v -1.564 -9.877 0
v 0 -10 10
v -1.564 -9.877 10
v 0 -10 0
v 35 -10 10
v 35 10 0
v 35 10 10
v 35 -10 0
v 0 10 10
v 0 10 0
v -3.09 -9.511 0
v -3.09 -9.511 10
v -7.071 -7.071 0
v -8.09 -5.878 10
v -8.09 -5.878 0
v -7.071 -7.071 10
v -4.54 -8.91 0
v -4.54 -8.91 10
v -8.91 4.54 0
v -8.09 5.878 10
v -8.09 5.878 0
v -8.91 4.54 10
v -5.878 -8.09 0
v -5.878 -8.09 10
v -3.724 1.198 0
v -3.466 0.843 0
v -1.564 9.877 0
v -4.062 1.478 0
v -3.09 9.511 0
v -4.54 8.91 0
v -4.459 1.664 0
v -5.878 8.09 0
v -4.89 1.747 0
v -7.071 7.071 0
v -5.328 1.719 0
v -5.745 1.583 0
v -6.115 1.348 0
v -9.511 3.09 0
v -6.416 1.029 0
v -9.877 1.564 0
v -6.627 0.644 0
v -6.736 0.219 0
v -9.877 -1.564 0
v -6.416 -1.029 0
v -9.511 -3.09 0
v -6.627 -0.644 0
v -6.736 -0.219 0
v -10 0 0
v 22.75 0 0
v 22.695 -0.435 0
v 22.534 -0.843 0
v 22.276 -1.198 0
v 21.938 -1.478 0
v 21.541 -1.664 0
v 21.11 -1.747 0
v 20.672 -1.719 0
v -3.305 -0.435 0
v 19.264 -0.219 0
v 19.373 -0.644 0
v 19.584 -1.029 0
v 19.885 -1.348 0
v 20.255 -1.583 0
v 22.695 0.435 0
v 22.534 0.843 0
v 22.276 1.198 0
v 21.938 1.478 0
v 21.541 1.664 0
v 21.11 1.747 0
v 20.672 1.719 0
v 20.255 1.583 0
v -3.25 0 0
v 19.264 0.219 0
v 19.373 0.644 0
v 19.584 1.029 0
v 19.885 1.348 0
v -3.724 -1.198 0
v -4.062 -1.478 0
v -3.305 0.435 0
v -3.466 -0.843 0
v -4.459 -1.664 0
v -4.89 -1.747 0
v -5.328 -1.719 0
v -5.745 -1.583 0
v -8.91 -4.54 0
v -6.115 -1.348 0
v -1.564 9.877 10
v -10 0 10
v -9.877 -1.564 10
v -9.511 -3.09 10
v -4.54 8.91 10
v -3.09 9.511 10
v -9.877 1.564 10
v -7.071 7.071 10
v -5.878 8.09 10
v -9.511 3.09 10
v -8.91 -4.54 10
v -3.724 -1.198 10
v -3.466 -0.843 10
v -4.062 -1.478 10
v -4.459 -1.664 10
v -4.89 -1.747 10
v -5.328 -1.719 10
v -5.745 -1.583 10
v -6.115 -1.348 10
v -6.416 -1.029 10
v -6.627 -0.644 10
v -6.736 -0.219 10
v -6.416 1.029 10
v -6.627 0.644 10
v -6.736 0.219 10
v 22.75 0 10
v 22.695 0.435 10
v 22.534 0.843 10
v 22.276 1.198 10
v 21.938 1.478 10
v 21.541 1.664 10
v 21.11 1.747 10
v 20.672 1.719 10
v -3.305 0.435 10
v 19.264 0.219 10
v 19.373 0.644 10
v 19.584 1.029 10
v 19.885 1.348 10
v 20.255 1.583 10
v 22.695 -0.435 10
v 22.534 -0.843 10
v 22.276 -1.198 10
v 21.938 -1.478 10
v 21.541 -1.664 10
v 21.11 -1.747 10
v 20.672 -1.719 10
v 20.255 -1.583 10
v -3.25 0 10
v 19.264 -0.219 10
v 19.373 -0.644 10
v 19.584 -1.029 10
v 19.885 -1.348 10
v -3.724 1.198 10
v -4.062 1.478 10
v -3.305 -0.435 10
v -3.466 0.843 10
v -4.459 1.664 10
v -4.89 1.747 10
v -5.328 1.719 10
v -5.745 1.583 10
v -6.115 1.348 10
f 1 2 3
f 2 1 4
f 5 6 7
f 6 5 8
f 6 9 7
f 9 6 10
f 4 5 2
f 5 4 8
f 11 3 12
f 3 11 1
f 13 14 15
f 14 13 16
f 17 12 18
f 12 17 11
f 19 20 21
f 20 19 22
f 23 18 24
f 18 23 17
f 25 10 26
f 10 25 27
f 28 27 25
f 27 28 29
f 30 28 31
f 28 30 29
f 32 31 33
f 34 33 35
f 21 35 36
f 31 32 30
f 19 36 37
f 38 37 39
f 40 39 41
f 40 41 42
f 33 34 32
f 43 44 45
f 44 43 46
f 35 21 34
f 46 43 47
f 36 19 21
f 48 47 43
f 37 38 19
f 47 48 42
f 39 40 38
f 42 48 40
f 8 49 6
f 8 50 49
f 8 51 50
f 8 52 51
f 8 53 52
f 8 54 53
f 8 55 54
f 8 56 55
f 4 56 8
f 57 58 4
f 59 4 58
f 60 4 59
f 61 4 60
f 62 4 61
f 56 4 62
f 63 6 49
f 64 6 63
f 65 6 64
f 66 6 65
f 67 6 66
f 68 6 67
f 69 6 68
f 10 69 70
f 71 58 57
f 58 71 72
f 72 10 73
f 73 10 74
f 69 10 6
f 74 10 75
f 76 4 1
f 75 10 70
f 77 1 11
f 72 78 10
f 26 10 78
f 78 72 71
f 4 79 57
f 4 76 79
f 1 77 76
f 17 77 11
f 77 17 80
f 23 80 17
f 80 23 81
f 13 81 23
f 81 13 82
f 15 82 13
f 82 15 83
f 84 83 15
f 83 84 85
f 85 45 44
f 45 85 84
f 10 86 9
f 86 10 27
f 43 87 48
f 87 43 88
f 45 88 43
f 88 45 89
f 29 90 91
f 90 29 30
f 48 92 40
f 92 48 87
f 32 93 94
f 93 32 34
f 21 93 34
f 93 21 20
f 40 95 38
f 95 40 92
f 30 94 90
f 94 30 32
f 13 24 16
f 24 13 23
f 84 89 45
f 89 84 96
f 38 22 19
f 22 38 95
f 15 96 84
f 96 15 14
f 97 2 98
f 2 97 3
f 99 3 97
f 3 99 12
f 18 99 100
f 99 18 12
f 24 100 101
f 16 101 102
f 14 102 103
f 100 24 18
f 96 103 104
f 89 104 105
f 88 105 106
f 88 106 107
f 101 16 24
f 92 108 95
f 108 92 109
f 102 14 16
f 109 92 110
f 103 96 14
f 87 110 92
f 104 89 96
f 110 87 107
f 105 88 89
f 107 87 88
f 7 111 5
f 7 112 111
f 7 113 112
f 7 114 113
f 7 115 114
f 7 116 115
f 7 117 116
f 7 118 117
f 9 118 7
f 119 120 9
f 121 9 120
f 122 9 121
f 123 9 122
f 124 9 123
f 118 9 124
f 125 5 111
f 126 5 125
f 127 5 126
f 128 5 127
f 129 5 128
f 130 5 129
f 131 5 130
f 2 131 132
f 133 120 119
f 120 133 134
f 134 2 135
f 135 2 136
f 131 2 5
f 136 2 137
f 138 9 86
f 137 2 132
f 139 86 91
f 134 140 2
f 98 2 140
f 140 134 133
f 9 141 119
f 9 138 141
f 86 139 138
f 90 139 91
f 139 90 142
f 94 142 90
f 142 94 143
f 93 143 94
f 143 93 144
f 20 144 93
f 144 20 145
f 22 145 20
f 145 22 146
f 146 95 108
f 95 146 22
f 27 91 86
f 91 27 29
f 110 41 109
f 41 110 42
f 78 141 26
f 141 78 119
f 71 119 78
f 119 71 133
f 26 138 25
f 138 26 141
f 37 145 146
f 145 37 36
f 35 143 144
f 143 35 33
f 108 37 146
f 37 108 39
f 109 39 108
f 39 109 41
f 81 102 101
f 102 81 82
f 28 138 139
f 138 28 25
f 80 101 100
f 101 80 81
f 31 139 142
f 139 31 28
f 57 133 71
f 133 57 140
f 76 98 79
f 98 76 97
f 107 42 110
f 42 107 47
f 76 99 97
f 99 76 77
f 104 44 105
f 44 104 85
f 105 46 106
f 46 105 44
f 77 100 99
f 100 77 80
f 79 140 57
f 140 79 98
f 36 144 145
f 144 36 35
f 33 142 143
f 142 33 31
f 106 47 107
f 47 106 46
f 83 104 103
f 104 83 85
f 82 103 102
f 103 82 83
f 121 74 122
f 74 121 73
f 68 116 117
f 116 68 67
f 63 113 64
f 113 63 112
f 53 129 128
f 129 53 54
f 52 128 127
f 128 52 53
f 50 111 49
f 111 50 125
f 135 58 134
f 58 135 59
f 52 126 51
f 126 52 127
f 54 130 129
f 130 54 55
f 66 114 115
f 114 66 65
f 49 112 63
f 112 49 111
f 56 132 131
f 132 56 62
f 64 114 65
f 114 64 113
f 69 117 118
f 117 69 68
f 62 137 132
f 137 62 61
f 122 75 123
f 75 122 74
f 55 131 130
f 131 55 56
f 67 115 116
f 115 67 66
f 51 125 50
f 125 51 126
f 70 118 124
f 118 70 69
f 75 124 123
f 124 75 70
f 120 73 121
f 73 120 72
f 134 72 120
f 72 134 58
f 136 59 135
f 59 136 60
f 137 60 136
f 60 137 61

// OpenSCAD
// kossel bed mount

module bedMount(screwDiam=3.5,thickness=10,length=35){
    width = 20;
    difference(){
        hull(){
            cylinder(d=width,h=thickness,$fn=40);
            translate([0,-width/2,0]) cube([length,width,thickness]);
        }
        #translate([-(width/2-5),0,-0.5]) cylinder(d=screwDiam,h=thickness+1,$fn=25);
        translate([(width/2-5)+16,0,-0.5]) cylinder(d=screwDiam,h=thickness+1,$fn=25);
        
    }
    
}
bedMount();
